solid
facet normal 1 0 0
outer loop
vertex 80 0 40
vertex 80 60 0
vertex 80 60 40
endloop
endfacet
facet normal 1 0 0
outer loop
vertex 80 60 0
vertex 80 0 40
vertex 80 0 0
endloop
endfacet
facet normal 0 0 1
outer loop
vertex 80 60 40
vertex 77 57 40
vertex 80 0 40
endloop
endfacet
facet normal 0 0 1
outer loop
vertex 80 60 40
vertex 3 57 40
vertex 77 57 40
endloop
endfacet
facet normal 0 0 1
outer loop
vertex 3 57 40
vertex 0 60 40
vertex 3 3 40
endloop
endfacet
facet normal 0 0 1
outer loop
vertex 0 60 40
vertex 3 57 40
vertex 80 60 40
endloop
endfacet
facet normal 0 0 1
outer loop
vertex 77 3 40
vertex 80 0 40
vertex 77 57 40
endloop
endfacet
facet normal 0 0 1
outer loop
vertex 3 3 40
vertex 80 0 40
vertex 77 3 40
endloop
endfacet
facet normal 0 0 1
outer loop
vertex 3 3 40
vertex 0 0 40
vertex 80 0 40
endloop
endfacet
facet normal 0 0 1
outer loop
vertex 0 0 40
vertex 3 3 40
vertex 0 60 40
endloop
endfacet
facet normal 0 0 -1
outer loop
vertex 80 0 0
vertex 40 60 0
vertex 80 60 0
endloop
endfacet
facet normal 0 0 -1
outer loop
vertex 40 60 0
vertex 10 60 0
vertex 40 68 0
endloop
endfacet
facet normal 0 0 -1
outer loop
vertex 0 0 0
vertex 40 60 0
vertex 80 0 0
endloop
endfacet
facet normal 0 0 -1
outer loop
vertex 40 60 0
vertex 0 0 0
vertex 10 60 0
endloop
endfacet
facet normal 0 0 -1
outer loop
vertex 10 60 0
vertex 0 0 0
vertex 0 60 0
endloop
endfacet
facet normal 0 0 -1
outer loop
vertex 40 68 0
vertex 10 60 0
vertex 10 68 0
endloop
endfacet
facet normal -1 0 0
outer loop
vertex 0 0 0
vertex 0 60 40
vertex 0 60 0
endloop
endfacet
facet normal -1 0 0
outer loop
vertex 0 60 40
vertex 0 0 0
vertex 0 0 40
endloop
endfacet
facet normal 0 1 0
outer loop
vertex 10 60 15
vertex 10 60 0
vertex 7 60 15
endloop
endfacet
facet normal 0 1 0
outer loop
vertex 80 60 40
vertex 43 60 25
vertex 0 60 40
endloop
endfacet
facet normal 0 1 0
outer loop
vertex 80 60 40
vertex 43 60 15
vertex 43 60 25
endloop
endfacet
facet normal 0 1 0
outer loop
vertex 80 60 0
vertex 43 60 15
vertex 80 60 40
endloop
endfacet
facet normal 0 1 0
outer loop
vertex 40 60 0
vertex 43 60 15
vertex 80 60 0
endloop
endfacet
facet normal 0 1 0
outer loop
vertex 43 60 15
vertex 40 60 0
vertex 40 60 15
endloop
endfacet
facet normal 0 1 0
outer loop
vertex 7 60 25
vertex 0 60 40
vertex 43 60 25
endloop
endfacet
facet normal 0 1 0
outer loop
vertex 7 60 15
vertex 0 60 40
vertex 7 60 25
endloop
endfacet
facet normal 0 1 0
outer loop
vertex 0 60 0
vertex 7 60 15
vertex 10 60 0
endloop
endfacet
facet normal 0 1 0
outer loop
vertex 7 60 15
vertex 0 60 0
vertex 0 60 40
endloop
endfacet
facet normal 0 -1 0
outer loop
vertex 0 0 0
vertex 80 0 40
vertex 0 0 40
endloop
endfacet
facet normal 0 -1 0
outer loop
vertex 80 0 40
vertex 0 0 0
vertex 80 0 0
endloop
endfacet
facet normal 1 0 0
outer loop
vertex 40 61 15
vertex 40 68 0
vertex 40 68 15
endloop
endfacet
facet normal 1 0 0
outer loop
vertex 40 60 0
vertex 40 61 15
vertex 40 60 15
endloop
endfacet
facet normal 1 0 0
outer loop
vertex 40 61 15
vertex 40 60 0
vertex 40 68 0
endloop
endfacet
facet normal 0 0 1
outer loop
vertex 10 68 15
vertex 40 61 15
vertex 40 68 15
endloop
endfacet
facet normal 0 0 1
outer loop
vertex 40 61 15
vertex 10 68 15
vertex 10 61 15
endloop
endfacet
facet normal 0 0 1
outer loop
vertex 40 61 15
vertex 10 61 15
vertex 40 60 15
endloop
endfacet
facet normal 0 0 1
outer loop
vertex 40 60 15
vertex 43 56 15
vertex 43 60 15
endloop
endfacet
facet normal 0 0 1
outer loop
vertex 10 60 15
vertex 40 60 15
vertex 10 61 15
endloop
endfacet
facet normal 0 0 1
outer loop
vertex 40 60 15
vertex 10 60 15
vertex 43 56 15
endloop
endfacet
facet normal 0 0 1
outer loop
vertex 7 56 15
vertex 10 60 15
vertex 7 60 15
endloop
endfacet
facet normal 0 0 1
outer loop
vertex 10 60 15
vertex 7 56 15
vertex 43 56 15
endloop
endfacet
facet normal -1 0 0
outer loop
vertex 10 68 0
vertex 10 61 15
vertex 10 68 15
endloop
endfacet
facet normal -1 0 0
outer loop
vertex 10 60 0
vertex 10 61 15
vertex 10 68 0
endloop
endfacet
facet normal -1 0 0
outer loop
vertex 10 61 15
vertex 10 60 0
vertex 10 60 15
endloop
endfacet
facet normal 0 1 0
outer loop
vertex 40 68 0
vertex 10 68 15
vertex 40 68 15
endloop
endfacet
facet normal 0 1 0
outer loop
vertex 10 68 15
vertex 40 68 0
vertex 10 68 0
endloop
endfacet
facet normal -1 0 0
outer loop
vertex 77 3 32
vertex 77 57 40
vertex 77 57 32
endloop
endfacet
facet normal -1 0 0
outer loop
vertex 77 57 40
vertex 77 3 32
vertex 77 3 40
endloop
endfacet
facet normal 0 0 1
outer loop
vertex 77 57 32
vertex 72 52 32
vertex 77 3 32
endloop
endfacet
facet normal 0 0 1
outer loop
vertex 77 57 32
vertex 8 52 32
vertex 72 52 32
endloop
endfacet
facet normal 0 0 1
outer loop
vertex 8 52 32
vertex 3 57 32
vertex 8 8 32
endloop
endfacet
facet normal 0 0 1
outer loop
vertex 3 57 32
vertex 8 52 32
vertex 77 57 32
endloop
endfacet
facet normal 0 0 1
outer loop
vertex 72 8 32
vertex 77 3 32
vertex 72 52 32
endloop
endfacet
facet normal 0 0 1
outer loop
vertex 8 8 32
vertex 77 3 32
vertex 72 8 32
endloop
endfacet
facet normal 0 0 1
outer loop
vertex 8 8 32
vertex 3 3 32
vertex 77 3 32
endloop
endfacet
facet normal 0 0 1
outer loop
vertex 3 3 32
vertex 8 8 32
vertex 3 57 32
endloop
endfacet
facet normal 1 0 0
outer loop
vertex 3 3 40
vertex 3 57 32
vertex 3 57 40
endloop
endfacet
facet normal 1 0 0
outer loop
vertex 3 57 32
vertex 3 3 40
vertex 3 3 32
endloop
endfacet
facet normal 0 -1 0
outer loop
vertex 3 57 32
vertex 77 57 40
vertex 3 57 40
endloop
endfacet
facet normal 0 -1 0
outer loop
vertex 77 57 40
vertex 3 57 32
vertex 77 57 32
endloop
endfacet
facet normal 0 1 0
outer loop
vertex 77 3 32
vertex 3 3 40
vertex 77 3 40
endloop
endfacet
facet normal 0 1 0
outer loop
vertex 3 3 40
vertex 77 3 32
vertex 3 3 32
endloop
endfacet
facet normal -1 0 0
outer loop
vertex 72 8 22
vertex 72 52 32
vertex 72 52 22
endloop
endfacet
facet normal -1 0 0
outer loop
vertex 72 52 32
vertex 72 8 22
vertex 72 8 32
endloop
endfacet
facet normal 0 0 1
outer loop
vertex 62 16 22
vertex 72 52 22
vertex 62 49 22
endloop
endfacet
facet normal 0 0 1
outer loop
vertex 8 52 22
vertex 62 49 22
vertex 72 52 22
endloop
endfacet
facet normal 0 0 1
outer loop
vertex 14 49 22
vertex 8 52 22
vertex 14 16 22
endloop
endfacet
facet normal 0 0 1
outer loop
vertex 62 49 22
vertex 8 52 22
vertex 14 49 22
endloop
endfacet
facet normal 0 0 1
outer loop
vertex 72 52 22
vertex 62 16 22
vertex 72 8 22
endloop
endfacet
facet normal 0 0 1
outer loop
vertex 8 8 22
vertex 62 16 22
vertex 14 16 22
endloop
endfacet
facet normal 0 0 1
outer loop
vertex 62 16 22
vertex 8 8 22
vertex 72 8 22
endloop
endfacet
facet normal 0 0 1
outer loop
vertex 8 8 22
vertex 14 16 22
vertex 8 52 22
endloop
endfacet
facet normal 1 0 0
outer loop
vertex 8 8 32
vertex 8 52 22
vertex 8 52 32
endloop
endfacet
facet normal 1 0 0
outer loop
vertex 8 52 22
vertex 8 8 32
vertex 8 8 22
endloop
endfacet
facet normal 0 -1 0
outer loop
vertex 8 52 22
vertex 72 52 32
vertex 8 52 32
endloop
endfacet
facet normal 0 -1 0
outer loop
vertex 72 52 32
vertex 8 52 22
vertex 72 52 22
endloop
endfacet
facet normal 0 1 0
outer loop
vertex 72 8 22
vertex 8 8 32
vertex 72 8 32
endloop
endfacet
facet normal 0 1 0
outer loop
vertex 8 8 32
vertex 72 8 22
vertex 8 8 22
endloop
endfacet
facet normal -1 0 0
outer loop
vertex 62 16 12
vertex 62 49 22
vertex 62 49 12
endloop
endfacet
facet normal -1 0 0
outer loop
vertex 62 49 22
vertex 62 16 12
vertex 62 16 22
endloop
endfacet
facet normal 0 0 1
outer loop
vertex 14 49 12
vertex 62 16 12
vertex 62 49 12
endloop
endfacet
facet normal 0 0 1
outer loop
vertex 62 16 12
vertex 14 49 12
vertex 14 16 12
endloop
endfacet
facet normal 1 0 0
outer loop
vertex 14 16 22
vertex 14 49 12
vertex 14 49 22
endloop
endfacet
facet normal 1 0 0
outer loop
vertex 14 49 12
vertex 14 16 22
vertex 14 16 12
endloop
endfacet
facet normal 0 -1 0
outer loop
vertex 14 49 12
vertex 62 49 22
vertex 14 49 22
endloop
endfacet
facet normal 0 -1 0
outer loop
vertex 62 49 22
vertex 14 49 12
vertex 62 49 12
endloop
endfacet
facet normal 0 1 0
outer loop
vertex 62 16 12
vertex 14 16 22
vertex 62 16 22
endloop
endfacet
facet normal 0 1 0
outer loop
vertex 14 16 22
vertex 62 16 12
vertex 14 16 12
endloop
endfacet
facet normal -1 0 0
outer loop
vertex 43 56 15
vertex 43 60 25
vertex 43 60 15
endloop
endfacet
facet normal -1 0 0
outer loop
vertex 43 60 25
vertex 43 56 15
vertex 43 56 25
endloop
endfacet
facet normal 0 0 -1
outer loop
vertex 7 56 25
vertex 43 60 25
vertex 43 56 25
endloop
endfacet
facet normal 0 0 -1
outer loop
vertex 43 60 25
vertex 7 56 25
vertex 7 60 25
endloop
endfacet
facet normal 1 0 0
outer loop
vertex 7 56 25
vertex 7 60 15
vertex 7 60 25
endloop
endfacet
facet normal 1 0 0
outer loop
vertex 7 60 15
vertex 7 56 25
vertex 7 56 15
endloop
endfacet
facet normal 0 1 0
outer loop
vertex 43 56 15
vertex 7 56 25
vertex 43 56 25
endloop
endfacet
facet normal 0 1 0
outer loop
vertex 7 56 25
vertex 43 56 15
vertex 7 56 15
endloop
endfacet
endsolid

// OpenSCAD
// === Parameters ===

// Main body dimensions
body_length = 80;
body_width  = 60;
body_height = 40;

// Rim / top recess (broad upper pocket)
rim_thickness   = 3;      // thin rim wall around upper recess
top_recess_depth = 8;     // depth of the uppermost pocket

// Middle stepped pocket (inset from upper recess walls)
mid_inset       = 5;      // additional inset per side from upper recess
mid_recess_depth = 10;    // depth of middle pocket

// Deepest pocket (shifted to one side for uneven ledges)
deep_inset_front = 8;     // inset from mid pocket on front side
deep_inset_back  = 3;     // inset from mid pocket on back side (less = shifted)
deep_inset_left  = 6;     // inset from mid pocket on left
deep_inset_right = 10;    // inset from mid pocket on right (asymmetric)
deep_recess_depth = 10;   // depth of deepest pocket
// Solid bottom remains below deepest pocket

// Side projection (boss) along one side (+Y side)
proj_length  = 30;        // length of projection along X
proj_width   = 8;         // how far it sticks out in Y
proj_height  = 15;        // height of projection
proj_x_offset = 10;       // offset from left edge of body
proj_z_offset = 0;        // sits on bottom of body

// Side recess above the projection (stepped tier on same face)
side_recess_length = proj_length + 6;  // slightly wider than projection
side_recess_depth  = 4;               // how deep into body wall (Y)
side_recess_height = 10;              // vertical extent
side_recess_x_offset = proj_x_offset - 3;
side_recess_z_offset = proj_z_offset + proj_height; // sits above projection

// Resolution
$fn = 32;

// === Derived dimensions for cavity cuts ===

// Upper recess cavity
upper_cav_x = body_length - 2 * rim_thickness;
upper_cav_y = body_width  - 2 * rim_thickness;

// Middle recess cavity
mid_cav_x = upper_cav_x - 2 * mid_inset;
mid_cav_y = upper_cav_y - 2 * mid_inset;

// Deep pocket cavity (asymmetric offsets from middle cavity edges)
deep_cav_x = mid_cav_x - deep_inset_left - deep_inset_right;
deep_cav_y = mid_cav_y - deep_inset_front - deep_inset_back;

// Deep pocket position relative to middle cavity origin
deep_origin_x = rim_thickness + mid_inset + deep_inset_left;
deep_origin_y = rim_thickness + mid_inset + deep_inset_front;

// === Assembly ===

// Combine body + projection, then subtract all cavities
union() {
    difference() {
        union() {
            // 1. Main rectangular body
            cube([body_length, body_width, body_height]);

            // 5. Added rectangular projection on +Y side
            translate([proj_x_offset, body_width, proj_z_offset])
                cube([proj_length, proj_width, proj_height]);
        }

        // 2. Upper recess — broad pocket from top, thin rim walls
        translate([rim_thickness, rim_thickness, body_height - top_recess_depth])
            cube([upper_cav_x, upper_cav_y, top_recess_depth + 1]); // +1 to clear top

        // 3. Middle stepped pocket — smaller inset, goes deeper
        translate([
            rim_thickness + mid_inset,
            rim_thickness + mid_inset,
            body_height - top_recess_depth - mid_recess_depth
        ])
            cube([mid_cav_x, mid_cav_y, mid_recess_depth + 1]);

        // 4. Deepest pocket — shifted to one side, solid bottom remains
        translate([
            deep_origin_x,
            deep_origin_y,
            body_height - top_recess_depth - mid_recess_depth - deep_recess_depth
        ])
            cube([deep_cav_x, deep_cav_y, deep_recess_depth + 1]);

        // 6. Side recess above projection on +Y face (cut into body wall)
        translate([
            side_recess_x_offset,
            body_width - side_recess_depth,
            side_recess_z_offset
        ])
            cube([side_recess_length, side_recess_depth + 1, side_recess_height]);
    }
}
